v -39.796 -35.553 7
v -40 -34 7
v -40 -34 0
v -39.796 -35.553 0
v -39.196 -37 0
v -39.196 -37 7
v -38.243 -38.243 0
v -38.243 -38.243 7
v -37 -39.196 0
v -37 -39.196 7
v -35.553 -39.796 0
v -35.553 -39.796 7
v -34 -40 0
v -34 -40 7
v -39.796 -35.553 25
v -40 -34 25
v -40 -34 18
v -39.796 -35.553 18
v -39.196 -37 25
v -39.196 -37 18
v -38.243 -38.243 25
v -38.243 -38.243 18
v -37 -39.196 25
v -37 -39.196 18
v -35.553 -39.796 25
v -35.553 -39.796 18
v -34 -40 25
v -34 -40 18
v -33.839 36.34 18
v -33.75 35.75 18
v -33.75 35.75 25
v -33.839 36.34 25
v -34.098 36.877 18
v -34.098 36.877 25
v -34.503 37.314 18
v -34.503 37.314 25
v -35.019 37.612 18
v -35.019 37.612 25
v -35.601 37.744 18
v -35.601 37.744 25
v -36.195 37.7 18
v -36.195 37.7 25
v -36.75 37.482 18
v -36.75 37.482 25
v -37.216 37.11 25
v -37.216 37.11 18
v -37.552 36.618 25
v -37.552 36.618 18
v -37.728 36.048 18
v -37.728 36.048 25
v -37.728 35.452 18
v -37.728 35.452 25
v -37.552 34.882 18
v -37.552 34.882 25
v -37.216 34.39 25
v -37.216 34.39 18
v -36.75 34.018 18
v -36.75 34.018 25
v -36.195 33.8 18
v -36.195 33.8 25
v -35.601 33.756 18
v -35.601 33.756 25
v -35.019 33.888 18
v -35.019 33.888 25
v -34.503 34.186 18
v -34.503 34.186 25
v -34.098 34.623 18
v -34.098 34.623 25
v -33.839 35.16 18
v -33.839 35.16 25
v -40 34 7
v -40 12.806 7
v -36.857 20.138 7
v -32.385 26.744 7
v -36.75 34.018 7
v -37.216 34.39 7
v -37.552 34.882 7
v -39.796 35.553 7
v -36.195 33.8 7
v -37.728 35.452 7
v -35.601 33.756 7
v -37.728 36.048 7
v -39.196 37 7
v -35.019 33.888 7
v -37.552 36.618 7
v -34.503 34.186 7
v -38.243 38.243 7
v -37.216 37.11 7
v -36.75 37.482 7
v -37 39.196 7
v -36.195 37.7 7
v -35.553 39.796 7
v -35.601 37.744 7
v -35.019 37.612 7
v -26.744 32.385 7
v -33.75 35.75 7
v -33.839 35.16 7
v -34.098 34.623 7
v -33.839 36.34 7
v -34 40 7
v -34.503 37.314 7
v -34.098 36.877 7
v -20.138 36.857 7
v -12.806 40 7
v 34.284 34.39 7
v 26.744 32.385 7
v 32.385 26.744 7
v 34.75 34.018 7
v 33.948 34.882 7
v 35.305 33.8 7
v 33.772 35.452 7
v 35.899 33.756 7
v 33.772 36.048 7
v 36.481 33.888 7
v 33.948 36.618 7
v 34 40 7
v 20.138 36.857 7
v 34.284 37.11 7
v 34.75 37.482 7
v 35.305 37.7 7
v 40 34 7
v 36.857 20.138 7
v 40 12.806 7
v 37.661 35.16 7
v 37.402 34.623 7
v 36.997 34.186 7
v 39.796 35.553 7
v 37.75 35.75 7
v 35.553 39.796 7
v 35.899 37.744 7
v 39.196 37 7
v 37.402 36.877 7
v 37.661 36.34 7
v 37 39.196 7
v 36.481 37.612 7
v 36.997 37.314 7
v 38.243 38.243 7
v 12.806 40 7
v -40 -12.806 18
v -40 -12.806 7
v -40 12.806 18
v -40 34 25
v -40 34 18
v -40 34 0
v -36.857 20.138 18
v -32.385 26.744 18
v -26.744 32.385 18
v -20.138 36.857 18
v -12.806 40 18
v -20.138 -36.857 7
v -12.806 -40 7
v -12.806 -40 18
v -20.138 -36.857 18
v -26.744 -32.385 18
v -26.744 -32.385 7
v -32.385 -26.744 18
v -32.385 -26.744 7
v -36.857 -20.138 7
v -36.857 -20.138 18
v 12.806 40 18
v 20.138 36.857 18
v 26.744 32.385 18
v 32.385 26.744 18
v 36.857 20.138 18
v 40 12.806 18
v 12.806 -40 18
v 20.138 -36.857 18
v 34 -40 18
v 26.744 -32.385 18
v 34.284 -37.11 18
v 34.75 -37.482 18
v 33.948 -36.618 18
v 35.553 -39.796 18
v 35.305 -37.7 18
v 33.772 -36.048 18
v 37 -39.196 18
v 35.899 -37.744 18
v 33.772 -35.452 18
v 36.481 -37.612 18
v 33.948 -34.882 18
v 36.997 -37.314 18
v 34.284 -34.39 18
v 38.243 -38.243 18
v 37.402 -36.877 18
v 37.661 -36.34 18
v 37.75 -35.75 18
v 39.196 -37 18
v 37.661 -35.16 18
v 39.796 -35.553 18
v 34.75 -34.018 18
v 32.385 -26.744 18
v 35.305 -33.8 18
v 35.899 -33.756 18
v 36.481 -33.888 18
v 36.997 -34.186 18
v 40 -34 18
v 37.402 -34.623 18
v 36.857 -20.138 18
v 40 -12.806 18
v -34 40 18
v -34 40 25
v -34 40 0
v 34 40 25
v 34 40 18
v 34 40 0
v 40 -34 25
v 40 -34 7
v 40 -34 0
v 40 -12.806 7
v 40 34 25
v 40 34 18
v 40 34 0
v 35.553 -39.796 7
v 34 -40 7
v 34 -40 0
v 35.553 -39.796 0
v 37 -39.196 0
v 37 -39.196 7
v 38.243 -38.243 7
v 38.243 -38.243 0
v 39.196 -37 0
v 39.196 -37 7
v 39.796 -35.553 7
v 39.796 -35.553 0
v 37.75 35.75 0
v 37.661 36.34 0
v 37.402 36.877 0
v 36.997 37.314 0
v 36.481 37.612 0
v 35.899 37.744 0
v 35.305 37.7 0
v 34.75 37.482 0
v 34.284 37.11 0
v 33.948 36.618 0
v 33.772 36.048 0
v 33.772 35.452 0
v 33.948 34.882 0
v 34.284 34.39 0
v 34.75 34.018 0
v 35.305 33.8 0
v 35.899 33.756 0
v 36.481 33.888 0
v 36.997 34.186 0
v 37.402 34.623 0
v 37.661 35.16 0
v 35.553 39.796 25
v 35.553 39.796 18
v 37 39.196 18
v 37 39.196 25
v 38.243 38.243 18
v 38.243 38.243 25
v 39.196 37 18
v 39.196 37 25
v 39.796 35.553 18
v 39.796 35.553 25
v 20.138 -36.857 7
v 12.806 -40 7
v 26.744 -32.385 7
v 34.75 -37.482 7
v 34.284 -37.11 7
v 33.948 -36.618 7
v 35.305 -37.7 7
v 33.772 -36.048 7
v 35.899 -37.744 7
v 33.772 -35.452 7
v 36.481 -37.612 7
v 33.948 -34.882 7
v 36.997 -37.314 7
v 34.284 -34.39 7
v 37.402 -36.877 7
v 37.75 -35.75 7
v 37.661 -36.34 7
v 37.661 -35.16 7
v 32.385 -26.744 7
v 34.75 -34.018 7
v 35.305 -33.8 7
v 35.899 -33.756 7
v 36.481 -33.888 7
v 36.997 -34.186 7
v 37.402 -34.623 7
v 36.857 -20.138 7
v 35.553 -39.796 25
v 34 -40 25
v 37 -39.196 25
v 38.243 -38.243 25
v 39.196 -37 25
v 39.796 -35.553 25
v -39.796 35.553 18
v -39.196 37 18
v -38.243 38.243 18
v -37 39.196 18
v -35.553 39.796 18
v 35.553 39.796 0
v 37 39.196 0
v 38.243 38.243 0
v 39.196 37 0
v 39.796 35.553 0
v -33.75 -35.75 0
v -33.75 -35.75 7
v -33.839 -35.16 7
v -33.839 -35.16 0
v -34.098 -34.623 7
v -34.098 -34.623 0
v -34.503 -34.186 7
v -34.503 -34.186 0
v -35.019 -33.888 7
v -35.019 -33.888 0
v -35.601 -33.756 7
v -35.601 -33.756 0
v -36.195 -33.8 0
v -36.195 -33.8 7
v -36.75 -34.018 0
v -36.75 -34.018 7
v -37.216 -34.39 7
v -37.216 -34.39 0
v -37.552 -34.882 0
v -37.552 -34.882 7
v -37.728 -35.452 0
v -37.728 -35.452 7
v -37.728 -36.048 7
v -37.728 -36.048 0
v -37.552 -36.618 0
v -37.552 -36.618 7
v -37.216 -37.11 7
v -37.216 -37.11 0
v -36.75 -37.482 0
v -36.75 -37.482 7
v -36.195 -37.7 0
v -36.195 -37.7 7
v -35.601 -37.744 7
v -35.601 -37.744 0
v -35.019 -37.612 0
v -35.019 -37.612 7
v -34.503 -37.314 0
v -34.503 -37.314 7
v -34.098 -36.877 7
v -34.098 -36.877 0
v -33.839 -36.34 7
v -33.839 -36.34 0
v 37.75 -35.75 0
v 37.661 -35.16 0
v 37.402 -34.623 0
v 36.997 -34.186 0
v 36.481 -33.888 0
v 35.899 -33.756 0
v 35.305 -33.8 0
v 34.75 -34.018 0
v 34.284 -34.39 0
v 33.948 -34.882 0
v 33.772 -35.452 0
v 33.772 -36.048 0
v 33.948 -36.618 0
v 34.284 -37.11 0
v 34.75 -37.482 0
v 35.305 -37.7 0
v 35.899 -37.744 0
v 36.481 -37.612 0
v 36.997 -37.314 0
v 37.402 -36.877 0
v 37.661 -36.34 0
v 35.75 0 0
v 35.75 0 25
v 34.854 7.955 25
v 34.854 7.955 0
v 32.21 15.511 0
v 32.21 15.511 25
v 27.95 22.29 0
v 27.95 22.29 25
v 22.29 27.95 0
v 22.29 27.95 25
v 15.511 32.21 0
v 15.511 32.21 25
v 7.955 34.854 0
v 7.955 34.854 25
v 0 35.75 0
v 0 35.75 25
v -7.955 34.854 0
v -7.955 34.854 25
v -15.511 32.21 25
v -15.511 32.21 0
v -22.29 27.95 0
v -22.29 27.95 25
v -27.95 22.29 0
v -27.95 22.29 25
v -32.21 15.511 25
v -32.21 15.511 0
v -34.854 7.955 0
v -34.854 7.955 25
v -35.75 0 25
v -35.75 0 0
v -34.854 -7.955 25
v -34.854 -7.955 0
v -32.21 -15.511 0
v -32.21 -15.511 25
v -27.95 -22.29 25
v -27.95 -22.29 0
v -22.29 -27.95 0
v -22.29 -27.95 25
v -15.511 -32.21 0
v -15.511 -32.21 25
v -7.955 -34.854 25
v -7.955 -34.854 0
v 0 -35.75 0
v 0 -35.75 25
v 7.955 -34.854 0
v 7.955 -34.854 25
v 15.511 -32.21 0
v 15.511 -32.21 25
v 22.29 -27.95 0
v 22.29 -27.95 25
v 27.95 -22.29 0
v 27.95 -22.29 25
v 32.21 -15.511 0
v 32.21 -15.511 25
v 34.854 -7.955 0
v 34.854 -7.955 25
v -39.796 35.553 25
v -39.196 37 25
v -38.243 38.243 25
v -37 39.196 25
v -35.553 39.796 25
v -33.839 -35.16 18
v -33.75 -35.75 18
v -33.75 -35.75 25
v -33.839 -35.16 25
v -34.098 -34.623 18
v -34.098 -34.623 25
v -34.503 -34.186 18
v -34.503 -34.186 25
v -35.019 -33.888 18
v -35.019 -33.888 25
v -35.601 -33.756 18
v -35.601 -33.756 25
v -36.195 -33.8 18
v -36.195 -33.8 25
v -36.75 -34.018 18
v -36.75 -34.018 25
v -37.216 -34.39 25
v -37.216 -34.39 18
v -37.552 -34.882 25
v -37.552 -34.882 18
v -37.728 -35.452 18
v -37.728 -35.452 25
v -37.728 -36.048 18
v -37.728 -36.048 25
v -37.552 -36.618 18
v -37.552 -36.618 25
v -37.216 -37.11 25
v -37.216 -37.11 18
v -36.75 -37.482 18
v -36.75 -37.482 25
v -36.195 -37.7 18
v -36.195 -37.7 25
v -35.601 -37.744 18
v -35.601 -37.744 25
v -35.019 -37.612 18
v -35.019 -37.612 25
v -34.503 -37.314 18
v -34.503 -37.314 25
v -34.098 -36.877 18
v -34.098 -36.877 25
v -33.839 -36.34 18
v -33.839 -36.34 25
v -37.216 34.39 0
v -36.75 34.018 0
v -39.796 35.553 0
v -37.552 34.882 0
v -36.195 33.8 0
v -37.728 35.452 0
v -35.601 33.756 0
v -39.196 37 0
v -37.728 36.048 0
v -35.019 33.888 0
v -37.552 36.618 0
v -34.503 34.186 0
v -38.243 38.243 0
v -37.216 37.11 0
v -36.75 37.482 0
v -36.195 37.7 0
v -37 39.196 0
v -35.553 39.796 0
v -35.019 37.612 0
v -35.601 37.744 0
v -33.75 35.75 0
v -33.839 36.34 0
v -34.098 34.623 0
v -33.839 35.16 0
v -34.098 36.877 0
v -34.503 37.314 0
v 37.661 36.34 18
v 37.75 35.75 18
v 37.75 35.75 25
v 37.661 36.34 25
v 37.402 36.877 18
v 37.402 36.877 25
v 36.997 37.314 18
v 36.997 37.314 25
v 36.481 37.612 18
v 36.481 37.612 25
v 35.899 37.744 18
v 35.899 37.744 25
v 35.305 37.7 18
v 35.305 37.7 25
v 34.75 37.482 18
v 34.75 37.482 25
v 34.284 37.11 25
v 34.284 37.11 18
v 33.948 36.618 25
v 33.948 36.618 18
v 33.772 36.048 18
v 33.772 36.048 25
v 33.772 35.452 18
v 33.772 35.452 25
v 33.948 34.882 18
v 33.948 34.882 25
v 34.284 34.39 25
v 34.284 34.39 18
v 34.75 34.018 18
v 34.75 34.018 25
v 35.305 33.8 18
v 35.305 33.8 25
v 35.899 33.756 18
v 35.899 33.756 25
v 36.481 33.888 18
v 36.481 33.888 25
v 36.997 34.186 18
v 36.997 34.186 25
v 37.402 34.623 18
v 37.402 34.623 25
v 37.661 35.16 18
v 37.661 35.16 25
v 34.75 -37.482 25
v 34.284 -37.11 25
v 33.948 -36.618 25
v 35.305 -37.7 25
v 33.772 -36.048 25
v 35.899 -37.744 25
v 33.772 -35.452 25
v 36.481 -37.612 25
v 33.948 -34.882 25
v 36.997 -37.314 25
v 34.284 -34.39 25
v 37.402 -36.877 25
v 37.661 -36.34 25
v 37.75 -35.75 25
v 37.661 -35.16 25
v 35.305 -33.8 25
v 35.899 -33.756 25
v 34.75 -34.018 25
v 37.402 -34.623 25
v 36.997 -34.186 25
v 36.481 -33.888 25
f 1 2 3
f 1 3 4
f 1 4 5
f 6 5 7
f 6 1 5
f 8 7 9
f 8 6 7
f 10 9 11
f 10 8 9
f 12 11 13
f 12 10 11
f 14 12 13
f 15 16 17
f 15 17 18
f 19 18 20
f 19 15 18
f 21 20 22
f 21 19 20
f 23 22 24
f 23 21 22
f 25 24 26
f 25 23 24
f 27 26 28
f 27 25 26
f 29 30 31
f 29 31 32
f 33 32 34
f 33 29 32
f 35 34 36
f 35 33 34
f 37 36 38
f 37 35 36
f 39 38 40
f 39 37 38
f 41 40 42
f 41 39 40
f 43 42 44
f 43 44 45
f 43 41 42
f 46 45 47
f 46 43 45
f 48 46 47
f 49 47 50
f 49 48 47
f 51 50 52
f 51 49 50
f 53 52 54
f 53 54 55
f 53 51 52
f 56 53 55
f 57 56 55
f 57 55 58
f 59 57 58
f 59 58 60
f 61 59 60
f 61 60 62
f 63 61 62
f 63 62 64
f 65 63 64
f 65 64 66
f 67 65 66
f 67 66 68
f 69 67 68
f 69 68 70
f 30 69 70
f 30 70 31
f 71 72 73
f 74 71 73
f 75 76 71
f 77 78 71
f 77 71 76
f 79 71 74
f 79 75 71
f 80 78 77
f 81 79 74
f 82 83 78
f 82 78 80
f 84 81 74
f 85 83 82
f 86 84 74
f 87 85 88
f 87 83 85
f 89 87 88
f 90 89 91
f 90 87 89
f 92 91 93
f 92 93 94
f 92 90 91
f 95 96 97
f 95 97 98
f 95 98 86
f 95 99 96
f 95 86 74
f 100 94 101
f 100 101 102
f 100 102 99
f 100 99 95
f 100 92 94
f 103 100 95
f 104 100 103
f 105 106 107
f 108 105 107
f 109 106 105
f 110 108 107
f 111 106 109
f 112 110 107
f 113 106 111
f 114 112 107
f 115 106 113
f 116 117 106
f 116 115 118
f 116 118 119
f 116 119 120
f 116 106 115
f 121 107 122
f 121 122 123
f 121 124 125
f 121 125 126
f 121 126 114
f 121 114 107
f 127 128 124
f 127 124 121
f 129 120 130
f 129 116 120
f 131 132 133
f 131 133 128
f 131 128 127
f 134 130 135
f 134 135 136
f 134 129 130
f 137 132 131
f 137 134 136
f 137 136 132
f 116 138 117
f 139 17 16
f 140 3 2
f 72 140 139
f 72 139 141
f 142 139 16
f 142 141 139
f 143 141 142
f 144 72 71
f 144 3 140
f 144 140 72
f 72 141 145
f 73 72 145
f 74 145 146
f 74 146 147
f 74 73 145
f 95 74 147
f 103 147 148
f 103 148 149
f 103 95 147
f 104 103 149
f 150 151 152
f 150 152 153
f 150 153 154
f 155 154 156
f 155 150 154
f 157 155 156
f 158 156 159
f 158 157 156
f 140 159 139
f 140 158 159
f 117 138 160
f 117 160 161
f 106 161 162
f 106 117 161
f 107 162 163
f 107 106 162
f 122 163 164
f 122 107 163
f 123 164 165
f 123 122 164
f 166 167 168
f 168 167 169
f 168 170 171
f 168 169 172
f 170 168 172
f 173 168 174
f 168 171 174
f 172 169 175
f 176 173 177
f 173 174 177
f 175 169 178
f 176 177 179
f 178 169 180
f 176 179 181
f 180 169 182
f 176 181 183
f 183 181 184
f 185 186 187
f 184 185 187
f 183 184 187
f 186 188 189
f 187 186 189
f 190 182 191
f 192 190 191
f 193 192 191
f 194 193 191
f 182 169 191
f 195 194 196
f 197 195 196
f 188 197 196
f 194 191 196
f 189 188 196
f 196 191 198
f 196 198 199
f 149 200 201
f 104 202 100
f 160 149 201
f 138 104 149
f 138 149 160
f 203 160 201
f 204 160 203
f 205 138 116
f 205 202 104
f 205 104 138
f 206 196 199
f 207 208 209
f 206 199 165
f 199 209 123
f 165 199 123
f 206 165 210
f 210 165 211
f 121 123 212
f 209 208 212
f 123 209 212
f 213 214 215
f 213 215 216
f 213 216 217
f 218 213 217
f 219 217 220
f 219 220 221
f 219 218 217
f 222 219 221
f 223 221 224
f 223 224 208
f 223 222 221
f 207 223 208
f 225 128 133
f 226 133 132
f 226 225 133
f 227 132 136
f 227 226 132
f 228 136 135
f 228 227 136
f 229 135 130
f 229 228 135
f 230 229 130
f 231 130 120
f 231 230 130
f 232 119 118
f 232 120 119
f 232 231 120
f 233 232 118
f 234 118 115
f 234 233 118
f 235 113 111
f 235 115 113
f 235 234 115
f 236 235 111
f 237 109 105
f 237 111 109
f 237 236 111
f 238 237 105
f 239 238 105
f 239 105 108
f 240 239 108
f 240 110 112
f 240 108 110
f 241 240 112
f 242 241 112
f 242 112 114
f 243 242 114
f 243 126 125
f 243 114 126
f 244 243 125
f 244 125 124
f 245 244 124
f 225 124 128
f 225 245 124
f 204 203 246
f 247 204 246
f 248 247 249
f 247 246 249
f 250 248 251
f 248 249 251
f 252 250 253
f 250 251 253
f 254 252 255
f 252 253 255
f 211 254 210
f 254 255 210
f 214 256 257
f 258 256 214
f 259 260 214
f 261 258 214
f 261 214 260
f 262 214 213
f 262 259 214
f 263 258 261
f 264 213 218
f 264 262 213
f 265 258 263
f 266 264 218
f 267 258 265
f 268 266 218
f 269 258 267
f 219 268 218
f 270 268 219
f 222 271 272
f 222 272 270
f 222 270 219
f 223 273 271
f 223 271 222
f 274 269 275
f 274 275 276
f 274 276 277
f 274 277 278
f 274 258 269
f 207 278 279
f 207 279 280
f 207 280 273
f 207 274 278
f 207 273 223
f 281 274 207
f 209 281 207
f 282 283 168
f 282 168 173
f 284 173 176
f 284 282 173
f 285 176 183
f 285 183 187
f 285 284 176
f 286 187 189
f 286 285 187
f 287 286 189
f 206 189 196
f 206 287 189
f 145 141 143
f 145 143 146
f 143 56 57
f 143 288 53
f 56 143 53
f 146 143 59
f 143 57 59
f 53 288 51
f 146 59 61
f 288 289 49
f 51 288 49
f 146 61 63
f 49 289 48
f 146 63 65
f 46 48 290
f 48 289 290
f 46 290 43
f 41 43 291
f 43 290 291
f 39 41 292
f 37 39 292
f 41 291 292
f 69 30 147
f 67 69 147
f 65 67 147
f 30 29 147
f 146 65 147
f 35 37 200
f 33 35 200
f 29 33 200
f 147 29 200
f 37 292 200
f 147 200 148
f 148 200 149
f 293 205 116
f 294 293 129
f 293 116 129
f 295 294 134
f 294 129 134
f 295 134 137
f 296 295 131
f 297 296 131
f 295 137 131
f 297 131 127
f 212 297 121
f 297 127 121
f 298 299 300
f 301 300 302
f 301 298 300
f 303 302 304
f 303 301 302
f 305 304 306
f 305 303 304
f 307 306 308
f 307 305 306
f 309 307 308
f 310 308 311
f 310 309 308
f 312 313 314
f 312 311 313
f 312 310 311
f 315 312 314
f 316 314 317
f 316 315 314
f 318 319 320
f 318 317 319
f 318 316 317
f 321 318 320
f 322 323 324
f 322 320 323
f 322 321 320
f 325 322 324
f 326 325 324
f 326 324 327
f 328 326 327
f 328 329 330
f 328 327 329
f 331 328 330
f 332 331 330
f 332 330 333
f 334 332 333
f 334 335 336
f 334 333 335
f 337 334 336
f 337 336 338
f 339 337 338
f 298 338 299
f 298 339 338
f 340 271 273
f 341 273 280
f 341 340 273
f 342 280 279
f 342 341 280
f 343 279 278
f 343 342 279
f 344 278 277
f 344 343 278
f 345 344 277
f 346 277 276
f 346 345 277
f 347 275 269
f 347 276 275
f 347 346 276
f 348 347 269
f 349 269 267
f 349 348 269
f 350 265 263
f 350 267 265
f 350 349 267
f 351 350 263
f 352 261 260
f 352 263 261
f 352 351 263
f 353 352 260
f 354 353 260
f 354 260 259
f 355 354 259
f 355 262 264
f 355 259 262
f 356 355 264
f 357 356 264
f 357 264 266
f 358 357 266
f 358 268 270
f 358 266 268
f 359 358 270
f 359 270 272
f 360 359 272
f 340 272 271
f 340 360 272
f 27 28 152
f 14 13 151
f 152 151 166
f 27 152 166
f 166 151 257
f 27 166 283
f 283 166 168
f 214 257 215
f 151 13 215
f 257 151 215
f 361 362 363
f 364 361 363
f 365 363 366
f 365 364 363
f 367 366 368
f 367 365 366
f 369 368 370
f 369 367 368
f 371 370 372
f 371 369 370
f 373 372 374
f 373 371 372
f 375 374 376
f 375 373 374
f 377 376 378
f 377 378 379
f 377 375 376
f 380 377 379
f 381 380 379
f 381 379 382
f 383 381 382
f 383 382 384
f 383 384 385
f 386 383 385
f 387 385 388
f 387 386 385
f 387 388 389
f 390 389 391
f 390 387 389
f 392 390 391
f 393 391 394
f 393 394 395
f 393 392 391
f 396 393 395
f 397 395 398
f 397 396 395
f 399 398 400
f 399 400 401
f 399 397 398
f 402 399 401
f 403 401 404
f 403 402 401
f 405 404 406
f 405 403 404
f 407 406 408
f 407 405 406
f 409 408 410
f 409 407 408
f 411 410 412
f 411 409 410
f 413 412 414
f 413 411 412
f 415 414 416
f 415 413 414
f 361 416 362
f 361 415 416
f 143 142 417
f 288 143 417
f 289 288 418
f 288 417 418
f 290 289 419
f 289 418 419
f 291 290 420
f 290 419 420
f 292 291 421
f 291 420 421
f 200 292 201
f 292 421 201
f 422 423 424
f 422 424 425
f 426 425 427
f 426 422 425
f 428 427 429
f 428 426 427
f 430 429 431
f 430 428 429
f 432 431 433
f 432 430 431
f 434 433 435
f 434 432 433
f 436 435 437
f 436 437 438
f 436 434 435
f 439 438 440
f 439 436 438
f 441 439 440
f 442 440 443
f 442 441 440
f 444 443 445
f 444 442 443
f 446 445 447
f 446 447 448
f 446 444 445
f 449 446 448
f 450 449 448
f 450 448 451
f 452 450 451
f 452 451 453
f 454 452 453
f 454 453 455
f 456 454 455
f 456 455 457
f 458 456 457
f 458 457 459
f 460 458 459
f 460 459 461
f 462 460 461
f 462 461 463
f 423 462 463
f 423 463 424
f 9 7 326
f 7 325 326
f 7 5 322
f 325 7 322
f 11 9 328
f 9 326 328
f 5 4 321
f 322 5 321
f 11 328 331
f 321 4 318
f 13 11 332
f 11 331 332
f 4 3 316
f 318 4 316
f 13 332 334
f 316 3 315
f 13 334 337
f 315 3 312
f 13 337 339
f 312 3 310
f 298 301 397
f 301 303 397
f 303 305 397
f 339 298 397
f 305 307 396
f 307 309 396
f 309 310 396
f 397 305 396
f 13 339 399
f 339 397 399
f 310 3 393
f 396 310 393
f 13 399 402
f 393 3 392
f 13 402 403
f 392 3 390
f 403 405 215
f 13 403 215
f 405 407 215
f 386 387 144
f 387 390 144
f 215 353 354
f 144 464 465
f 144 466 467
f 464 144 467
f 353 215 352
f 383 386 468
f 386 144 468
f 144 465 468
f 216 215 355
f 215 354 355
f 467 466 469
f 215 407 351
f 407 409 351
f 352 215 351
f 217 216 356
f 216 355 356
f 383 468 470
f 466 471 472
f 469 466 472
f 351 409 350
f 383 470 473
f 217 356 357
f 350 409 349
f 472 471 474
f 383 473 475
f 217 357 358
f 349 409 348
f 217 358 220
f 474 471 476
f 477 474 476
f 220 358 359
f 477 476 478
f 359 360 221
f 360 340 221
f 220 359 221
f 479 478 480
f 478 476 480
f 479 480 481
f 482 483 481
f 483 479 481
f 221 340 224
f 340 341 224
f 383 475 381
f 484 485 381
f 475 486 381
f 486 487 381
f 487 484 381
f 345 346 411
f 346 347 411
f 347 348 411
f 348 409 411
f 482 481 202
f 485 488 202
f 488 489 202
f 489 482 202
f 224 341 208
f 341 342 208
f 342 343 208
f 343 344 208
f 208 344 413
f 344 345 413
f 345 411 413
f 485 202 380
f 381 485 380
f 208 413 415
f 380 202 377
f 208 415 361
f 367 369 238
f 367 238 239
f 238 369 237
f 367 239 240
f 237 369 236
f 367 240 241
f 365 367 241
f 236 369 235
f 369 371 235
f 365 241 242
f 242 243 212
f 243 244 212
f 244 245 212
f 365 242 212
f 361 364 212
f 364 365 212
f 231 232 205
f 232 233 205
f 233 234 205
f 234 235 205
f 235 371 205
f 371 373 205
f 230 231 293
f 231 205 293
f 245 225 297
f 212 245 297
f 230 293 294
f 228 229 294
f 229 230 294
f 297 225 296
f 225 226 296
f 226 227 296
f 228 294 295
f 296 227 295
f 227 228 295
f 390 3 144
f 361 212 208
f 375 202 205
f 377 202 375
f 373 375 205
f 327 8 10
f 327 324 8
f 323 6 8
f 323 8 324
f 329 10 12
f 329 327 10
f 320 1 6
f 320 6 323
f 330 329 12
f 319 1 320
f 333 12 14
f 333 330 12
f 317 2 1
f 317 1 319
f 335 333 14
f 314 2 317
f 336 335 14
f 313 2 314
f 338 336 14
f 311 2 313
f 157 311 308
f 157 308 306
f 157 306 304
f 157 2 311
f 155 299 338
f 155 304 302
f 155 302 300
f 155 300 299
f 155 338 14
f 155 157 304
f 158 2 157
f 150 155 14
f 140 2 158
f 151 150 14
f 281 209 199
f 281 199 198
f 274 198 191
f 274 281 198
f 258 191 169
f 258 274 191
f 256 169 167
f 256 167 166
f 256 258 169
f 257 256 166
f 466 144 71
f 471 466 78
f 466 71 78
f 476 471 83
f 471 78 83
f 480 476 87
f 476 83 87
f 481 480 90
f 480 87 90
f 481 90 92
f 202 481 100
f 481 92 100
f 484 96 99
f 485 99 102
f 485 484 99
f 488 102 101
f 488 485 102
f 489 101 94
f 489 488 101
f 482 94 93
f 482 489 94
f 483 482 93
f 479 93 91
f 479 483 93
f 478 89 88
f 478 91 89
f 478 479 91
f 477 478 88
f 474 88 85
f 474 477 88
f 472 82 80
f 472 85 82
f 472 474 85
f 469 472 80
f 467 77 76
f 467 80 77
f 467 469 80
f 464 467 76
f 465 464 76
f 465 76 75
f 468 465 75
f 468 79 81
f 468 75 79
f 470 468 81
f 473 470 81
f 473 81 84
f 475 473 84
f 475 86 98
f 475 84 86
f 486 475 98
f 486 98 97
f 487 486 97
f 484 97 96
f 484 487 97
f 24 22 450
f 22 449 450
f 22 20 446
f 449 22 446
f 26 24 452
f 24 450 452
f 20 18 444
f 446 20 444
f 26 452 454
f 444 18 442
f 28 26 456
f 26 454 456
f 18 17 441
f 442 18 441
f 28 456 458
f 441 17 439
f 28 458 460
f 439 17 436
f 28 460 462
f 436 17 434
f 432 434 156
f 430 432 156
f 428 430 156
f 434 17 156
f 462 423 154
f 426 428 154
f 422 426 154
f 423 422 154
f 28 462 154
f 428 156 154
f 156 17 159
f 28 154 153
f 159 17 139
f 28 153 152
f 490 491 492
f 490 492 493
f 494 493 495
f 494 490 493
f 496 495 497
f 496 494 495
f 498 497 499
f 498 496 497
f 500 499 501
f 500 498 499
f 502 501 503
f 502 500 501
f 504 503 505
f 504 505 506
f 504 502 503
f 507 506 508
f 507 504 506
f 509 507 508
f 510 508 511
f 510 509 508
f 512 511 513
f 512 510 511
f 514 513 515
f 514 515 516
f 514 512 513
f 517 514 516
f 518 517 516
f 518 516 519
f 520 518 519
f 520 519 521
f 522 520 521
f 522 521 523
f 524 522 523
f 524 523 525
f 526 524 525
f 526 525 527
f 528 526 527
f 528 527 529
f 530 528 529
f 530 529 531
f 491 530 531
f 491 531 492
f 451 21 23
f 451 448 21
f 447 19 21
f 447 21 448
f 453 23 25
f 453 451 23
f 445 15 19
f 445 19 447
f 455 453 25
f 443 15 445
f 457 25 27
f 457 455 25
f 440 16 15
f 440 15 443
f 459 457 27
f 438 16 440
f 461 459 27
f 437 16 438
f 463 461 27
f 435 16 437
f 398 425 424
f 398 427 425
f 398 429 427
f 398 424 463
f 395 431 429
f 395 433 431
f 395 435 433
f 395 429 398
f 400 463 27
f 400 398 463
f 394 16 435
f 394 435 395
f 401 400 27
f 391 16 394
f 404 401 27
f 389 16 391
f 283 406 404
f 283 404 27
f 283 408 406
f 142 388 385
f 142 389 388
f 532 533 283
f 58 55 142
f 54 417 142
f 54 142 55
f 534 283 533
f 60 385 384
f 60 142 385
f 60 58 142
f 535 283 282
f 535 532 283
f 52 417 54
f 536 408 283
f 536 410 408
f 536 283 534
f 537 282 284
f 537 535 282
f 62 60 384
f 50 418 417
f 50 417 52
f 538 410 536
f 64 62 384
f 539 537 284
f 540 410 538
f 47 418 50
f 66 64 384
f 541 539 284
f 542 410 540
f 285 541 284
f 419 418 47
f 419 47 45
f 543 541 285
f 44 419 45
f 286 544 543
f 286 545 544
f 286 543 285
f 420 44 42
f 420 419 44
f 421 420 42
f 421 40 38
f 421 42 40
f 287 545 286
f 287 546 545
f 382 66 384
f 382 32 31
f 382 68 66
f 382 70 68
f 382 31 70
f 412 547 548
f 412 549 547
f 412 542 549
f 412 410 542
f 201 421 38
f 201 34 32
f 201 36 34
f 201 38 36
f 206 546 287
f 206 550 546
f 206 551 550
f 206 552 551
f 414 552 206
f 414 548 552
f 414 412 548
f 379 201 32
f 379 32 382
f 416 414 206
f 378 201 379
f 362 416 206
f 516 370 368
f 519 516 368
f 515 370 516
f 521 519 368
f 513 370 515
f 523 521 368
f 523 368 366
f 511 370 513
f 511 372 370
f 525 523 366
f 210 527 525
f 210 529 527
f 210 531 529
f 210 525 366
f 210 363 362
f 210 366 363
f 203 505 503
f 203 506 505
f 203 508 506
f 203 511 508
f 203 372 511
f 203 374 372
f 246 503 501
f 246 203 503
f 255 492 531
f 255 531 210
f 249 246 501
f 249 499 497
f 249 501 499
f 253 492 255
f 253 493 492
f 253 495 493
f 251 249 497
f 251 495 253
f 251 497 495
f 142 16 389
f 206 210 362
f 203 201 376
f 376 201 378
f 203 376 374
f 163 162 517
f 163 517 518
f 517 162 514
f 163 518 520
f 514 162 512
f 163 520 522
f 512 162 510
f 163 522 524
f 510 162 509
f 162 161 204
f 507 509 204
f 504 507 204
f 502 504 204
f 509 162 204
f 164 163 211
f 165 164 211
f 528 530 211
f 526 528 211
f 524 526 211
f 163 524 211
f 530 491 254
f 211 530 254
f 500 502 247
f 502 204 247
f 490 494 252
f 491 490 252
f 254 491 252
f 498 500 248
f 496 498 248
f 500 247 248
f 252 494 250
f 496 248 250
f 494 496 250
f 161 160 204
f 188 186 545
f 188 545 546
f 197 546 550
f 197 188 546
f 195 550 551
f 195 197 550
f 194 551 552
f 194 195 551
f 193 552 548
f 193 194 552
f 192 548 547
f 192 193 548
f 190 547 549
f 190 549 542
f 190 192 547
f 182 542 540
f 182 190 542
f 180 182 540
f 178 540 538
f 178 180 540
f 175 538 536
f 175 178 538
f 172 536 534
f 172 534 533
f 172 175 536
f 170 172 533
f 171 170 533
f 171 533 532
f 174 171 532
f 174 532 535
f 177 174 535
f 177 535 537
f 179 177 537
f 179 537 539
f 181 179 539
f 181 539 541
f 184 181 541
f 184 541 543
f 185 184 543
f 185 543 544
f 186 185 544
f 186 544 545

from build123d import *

# Parameters (mm, degrees)
F0_W     = 80
F0_H     = 80
F0_R     = 2
F0_R_2   = 35.75
F1_DEPTH = 25
F2_R     = 6
F5_DEPTH = 11


with BuildPart() as f1:
    # F0 (on Top) → F1 (new body)
    with BuildSketch(Plane.XY):
        Rectangle(F0_W, F0_H)
        with Locations((-35.75, -35.75)):
            Circle(F0_R, mode=Mode.SUBTRACT)
        with Locations((35.75, -35.75)):
            Circle(F0_R, mode=Mode.SUBTRACT)
        with Locations((-35.75, 35.75)):
            Circle(F0_R, mode=Mode.SUBTRACT)
        Circle(F0_R_2, mode=Mode.SUBTRACT)
        with Locations((35.75, 35.75)):
            Circle(F0_R, mode=Mode.SUBTRACT)
    extrude(amount=F1_DEPTH)

    # F2
    f2_edges = [f1.edges().sort_by_distance(p)[0] for p in [
        (-40, -40, 12.5),
        (40, -40, 12.5),
        (40, 40, 12.5),
        (-40, 40, 12.5),
    ]]
    fillet(f2_edges, radius=F2_R)

    # F4 (on offset) → F5 (cut)
    with BuildSketch(Plane.XY.offset(7)):
        with BuildLine():
            ThreePointArc((0, 42), (29.6984848098, 29.6984848098), (42, 0))
            Line((42, 0), (42, 42))
            Line((42, 42), (0, 42))
        make_face()
        with BuildLine():
            ThreePointArc((-42, 5.59e-08), (-29.6984847901, 29.6984848296), (0, 42))
            Line((0, 42), (-42, 42))
            Line((-42, 42), (-42, 5.59e-08))
        make_face()
        with BuildLine():
            Line((-42, -42), (1.331e-07, -42))
            ThreePointArc((1.331e-07, -42), (-29.6984847825, -29.6984848372), (-42, 5.59e-08))
            Line((-42, 5.59e-08), (-42, -42))
        make_face()
        with BuildLine():
            Line((42, -42), (42, 0))
            ThreePointArc((42, 0), (29.6984848569, -29.6984847628), (1.331e-07, -42))
            Line((1.331e-07, -42), (42, -42))
        make_face()
    extrude(amount=F5_DEPTH, mode=Mode.SUBTRACT)


solid = f1.part
